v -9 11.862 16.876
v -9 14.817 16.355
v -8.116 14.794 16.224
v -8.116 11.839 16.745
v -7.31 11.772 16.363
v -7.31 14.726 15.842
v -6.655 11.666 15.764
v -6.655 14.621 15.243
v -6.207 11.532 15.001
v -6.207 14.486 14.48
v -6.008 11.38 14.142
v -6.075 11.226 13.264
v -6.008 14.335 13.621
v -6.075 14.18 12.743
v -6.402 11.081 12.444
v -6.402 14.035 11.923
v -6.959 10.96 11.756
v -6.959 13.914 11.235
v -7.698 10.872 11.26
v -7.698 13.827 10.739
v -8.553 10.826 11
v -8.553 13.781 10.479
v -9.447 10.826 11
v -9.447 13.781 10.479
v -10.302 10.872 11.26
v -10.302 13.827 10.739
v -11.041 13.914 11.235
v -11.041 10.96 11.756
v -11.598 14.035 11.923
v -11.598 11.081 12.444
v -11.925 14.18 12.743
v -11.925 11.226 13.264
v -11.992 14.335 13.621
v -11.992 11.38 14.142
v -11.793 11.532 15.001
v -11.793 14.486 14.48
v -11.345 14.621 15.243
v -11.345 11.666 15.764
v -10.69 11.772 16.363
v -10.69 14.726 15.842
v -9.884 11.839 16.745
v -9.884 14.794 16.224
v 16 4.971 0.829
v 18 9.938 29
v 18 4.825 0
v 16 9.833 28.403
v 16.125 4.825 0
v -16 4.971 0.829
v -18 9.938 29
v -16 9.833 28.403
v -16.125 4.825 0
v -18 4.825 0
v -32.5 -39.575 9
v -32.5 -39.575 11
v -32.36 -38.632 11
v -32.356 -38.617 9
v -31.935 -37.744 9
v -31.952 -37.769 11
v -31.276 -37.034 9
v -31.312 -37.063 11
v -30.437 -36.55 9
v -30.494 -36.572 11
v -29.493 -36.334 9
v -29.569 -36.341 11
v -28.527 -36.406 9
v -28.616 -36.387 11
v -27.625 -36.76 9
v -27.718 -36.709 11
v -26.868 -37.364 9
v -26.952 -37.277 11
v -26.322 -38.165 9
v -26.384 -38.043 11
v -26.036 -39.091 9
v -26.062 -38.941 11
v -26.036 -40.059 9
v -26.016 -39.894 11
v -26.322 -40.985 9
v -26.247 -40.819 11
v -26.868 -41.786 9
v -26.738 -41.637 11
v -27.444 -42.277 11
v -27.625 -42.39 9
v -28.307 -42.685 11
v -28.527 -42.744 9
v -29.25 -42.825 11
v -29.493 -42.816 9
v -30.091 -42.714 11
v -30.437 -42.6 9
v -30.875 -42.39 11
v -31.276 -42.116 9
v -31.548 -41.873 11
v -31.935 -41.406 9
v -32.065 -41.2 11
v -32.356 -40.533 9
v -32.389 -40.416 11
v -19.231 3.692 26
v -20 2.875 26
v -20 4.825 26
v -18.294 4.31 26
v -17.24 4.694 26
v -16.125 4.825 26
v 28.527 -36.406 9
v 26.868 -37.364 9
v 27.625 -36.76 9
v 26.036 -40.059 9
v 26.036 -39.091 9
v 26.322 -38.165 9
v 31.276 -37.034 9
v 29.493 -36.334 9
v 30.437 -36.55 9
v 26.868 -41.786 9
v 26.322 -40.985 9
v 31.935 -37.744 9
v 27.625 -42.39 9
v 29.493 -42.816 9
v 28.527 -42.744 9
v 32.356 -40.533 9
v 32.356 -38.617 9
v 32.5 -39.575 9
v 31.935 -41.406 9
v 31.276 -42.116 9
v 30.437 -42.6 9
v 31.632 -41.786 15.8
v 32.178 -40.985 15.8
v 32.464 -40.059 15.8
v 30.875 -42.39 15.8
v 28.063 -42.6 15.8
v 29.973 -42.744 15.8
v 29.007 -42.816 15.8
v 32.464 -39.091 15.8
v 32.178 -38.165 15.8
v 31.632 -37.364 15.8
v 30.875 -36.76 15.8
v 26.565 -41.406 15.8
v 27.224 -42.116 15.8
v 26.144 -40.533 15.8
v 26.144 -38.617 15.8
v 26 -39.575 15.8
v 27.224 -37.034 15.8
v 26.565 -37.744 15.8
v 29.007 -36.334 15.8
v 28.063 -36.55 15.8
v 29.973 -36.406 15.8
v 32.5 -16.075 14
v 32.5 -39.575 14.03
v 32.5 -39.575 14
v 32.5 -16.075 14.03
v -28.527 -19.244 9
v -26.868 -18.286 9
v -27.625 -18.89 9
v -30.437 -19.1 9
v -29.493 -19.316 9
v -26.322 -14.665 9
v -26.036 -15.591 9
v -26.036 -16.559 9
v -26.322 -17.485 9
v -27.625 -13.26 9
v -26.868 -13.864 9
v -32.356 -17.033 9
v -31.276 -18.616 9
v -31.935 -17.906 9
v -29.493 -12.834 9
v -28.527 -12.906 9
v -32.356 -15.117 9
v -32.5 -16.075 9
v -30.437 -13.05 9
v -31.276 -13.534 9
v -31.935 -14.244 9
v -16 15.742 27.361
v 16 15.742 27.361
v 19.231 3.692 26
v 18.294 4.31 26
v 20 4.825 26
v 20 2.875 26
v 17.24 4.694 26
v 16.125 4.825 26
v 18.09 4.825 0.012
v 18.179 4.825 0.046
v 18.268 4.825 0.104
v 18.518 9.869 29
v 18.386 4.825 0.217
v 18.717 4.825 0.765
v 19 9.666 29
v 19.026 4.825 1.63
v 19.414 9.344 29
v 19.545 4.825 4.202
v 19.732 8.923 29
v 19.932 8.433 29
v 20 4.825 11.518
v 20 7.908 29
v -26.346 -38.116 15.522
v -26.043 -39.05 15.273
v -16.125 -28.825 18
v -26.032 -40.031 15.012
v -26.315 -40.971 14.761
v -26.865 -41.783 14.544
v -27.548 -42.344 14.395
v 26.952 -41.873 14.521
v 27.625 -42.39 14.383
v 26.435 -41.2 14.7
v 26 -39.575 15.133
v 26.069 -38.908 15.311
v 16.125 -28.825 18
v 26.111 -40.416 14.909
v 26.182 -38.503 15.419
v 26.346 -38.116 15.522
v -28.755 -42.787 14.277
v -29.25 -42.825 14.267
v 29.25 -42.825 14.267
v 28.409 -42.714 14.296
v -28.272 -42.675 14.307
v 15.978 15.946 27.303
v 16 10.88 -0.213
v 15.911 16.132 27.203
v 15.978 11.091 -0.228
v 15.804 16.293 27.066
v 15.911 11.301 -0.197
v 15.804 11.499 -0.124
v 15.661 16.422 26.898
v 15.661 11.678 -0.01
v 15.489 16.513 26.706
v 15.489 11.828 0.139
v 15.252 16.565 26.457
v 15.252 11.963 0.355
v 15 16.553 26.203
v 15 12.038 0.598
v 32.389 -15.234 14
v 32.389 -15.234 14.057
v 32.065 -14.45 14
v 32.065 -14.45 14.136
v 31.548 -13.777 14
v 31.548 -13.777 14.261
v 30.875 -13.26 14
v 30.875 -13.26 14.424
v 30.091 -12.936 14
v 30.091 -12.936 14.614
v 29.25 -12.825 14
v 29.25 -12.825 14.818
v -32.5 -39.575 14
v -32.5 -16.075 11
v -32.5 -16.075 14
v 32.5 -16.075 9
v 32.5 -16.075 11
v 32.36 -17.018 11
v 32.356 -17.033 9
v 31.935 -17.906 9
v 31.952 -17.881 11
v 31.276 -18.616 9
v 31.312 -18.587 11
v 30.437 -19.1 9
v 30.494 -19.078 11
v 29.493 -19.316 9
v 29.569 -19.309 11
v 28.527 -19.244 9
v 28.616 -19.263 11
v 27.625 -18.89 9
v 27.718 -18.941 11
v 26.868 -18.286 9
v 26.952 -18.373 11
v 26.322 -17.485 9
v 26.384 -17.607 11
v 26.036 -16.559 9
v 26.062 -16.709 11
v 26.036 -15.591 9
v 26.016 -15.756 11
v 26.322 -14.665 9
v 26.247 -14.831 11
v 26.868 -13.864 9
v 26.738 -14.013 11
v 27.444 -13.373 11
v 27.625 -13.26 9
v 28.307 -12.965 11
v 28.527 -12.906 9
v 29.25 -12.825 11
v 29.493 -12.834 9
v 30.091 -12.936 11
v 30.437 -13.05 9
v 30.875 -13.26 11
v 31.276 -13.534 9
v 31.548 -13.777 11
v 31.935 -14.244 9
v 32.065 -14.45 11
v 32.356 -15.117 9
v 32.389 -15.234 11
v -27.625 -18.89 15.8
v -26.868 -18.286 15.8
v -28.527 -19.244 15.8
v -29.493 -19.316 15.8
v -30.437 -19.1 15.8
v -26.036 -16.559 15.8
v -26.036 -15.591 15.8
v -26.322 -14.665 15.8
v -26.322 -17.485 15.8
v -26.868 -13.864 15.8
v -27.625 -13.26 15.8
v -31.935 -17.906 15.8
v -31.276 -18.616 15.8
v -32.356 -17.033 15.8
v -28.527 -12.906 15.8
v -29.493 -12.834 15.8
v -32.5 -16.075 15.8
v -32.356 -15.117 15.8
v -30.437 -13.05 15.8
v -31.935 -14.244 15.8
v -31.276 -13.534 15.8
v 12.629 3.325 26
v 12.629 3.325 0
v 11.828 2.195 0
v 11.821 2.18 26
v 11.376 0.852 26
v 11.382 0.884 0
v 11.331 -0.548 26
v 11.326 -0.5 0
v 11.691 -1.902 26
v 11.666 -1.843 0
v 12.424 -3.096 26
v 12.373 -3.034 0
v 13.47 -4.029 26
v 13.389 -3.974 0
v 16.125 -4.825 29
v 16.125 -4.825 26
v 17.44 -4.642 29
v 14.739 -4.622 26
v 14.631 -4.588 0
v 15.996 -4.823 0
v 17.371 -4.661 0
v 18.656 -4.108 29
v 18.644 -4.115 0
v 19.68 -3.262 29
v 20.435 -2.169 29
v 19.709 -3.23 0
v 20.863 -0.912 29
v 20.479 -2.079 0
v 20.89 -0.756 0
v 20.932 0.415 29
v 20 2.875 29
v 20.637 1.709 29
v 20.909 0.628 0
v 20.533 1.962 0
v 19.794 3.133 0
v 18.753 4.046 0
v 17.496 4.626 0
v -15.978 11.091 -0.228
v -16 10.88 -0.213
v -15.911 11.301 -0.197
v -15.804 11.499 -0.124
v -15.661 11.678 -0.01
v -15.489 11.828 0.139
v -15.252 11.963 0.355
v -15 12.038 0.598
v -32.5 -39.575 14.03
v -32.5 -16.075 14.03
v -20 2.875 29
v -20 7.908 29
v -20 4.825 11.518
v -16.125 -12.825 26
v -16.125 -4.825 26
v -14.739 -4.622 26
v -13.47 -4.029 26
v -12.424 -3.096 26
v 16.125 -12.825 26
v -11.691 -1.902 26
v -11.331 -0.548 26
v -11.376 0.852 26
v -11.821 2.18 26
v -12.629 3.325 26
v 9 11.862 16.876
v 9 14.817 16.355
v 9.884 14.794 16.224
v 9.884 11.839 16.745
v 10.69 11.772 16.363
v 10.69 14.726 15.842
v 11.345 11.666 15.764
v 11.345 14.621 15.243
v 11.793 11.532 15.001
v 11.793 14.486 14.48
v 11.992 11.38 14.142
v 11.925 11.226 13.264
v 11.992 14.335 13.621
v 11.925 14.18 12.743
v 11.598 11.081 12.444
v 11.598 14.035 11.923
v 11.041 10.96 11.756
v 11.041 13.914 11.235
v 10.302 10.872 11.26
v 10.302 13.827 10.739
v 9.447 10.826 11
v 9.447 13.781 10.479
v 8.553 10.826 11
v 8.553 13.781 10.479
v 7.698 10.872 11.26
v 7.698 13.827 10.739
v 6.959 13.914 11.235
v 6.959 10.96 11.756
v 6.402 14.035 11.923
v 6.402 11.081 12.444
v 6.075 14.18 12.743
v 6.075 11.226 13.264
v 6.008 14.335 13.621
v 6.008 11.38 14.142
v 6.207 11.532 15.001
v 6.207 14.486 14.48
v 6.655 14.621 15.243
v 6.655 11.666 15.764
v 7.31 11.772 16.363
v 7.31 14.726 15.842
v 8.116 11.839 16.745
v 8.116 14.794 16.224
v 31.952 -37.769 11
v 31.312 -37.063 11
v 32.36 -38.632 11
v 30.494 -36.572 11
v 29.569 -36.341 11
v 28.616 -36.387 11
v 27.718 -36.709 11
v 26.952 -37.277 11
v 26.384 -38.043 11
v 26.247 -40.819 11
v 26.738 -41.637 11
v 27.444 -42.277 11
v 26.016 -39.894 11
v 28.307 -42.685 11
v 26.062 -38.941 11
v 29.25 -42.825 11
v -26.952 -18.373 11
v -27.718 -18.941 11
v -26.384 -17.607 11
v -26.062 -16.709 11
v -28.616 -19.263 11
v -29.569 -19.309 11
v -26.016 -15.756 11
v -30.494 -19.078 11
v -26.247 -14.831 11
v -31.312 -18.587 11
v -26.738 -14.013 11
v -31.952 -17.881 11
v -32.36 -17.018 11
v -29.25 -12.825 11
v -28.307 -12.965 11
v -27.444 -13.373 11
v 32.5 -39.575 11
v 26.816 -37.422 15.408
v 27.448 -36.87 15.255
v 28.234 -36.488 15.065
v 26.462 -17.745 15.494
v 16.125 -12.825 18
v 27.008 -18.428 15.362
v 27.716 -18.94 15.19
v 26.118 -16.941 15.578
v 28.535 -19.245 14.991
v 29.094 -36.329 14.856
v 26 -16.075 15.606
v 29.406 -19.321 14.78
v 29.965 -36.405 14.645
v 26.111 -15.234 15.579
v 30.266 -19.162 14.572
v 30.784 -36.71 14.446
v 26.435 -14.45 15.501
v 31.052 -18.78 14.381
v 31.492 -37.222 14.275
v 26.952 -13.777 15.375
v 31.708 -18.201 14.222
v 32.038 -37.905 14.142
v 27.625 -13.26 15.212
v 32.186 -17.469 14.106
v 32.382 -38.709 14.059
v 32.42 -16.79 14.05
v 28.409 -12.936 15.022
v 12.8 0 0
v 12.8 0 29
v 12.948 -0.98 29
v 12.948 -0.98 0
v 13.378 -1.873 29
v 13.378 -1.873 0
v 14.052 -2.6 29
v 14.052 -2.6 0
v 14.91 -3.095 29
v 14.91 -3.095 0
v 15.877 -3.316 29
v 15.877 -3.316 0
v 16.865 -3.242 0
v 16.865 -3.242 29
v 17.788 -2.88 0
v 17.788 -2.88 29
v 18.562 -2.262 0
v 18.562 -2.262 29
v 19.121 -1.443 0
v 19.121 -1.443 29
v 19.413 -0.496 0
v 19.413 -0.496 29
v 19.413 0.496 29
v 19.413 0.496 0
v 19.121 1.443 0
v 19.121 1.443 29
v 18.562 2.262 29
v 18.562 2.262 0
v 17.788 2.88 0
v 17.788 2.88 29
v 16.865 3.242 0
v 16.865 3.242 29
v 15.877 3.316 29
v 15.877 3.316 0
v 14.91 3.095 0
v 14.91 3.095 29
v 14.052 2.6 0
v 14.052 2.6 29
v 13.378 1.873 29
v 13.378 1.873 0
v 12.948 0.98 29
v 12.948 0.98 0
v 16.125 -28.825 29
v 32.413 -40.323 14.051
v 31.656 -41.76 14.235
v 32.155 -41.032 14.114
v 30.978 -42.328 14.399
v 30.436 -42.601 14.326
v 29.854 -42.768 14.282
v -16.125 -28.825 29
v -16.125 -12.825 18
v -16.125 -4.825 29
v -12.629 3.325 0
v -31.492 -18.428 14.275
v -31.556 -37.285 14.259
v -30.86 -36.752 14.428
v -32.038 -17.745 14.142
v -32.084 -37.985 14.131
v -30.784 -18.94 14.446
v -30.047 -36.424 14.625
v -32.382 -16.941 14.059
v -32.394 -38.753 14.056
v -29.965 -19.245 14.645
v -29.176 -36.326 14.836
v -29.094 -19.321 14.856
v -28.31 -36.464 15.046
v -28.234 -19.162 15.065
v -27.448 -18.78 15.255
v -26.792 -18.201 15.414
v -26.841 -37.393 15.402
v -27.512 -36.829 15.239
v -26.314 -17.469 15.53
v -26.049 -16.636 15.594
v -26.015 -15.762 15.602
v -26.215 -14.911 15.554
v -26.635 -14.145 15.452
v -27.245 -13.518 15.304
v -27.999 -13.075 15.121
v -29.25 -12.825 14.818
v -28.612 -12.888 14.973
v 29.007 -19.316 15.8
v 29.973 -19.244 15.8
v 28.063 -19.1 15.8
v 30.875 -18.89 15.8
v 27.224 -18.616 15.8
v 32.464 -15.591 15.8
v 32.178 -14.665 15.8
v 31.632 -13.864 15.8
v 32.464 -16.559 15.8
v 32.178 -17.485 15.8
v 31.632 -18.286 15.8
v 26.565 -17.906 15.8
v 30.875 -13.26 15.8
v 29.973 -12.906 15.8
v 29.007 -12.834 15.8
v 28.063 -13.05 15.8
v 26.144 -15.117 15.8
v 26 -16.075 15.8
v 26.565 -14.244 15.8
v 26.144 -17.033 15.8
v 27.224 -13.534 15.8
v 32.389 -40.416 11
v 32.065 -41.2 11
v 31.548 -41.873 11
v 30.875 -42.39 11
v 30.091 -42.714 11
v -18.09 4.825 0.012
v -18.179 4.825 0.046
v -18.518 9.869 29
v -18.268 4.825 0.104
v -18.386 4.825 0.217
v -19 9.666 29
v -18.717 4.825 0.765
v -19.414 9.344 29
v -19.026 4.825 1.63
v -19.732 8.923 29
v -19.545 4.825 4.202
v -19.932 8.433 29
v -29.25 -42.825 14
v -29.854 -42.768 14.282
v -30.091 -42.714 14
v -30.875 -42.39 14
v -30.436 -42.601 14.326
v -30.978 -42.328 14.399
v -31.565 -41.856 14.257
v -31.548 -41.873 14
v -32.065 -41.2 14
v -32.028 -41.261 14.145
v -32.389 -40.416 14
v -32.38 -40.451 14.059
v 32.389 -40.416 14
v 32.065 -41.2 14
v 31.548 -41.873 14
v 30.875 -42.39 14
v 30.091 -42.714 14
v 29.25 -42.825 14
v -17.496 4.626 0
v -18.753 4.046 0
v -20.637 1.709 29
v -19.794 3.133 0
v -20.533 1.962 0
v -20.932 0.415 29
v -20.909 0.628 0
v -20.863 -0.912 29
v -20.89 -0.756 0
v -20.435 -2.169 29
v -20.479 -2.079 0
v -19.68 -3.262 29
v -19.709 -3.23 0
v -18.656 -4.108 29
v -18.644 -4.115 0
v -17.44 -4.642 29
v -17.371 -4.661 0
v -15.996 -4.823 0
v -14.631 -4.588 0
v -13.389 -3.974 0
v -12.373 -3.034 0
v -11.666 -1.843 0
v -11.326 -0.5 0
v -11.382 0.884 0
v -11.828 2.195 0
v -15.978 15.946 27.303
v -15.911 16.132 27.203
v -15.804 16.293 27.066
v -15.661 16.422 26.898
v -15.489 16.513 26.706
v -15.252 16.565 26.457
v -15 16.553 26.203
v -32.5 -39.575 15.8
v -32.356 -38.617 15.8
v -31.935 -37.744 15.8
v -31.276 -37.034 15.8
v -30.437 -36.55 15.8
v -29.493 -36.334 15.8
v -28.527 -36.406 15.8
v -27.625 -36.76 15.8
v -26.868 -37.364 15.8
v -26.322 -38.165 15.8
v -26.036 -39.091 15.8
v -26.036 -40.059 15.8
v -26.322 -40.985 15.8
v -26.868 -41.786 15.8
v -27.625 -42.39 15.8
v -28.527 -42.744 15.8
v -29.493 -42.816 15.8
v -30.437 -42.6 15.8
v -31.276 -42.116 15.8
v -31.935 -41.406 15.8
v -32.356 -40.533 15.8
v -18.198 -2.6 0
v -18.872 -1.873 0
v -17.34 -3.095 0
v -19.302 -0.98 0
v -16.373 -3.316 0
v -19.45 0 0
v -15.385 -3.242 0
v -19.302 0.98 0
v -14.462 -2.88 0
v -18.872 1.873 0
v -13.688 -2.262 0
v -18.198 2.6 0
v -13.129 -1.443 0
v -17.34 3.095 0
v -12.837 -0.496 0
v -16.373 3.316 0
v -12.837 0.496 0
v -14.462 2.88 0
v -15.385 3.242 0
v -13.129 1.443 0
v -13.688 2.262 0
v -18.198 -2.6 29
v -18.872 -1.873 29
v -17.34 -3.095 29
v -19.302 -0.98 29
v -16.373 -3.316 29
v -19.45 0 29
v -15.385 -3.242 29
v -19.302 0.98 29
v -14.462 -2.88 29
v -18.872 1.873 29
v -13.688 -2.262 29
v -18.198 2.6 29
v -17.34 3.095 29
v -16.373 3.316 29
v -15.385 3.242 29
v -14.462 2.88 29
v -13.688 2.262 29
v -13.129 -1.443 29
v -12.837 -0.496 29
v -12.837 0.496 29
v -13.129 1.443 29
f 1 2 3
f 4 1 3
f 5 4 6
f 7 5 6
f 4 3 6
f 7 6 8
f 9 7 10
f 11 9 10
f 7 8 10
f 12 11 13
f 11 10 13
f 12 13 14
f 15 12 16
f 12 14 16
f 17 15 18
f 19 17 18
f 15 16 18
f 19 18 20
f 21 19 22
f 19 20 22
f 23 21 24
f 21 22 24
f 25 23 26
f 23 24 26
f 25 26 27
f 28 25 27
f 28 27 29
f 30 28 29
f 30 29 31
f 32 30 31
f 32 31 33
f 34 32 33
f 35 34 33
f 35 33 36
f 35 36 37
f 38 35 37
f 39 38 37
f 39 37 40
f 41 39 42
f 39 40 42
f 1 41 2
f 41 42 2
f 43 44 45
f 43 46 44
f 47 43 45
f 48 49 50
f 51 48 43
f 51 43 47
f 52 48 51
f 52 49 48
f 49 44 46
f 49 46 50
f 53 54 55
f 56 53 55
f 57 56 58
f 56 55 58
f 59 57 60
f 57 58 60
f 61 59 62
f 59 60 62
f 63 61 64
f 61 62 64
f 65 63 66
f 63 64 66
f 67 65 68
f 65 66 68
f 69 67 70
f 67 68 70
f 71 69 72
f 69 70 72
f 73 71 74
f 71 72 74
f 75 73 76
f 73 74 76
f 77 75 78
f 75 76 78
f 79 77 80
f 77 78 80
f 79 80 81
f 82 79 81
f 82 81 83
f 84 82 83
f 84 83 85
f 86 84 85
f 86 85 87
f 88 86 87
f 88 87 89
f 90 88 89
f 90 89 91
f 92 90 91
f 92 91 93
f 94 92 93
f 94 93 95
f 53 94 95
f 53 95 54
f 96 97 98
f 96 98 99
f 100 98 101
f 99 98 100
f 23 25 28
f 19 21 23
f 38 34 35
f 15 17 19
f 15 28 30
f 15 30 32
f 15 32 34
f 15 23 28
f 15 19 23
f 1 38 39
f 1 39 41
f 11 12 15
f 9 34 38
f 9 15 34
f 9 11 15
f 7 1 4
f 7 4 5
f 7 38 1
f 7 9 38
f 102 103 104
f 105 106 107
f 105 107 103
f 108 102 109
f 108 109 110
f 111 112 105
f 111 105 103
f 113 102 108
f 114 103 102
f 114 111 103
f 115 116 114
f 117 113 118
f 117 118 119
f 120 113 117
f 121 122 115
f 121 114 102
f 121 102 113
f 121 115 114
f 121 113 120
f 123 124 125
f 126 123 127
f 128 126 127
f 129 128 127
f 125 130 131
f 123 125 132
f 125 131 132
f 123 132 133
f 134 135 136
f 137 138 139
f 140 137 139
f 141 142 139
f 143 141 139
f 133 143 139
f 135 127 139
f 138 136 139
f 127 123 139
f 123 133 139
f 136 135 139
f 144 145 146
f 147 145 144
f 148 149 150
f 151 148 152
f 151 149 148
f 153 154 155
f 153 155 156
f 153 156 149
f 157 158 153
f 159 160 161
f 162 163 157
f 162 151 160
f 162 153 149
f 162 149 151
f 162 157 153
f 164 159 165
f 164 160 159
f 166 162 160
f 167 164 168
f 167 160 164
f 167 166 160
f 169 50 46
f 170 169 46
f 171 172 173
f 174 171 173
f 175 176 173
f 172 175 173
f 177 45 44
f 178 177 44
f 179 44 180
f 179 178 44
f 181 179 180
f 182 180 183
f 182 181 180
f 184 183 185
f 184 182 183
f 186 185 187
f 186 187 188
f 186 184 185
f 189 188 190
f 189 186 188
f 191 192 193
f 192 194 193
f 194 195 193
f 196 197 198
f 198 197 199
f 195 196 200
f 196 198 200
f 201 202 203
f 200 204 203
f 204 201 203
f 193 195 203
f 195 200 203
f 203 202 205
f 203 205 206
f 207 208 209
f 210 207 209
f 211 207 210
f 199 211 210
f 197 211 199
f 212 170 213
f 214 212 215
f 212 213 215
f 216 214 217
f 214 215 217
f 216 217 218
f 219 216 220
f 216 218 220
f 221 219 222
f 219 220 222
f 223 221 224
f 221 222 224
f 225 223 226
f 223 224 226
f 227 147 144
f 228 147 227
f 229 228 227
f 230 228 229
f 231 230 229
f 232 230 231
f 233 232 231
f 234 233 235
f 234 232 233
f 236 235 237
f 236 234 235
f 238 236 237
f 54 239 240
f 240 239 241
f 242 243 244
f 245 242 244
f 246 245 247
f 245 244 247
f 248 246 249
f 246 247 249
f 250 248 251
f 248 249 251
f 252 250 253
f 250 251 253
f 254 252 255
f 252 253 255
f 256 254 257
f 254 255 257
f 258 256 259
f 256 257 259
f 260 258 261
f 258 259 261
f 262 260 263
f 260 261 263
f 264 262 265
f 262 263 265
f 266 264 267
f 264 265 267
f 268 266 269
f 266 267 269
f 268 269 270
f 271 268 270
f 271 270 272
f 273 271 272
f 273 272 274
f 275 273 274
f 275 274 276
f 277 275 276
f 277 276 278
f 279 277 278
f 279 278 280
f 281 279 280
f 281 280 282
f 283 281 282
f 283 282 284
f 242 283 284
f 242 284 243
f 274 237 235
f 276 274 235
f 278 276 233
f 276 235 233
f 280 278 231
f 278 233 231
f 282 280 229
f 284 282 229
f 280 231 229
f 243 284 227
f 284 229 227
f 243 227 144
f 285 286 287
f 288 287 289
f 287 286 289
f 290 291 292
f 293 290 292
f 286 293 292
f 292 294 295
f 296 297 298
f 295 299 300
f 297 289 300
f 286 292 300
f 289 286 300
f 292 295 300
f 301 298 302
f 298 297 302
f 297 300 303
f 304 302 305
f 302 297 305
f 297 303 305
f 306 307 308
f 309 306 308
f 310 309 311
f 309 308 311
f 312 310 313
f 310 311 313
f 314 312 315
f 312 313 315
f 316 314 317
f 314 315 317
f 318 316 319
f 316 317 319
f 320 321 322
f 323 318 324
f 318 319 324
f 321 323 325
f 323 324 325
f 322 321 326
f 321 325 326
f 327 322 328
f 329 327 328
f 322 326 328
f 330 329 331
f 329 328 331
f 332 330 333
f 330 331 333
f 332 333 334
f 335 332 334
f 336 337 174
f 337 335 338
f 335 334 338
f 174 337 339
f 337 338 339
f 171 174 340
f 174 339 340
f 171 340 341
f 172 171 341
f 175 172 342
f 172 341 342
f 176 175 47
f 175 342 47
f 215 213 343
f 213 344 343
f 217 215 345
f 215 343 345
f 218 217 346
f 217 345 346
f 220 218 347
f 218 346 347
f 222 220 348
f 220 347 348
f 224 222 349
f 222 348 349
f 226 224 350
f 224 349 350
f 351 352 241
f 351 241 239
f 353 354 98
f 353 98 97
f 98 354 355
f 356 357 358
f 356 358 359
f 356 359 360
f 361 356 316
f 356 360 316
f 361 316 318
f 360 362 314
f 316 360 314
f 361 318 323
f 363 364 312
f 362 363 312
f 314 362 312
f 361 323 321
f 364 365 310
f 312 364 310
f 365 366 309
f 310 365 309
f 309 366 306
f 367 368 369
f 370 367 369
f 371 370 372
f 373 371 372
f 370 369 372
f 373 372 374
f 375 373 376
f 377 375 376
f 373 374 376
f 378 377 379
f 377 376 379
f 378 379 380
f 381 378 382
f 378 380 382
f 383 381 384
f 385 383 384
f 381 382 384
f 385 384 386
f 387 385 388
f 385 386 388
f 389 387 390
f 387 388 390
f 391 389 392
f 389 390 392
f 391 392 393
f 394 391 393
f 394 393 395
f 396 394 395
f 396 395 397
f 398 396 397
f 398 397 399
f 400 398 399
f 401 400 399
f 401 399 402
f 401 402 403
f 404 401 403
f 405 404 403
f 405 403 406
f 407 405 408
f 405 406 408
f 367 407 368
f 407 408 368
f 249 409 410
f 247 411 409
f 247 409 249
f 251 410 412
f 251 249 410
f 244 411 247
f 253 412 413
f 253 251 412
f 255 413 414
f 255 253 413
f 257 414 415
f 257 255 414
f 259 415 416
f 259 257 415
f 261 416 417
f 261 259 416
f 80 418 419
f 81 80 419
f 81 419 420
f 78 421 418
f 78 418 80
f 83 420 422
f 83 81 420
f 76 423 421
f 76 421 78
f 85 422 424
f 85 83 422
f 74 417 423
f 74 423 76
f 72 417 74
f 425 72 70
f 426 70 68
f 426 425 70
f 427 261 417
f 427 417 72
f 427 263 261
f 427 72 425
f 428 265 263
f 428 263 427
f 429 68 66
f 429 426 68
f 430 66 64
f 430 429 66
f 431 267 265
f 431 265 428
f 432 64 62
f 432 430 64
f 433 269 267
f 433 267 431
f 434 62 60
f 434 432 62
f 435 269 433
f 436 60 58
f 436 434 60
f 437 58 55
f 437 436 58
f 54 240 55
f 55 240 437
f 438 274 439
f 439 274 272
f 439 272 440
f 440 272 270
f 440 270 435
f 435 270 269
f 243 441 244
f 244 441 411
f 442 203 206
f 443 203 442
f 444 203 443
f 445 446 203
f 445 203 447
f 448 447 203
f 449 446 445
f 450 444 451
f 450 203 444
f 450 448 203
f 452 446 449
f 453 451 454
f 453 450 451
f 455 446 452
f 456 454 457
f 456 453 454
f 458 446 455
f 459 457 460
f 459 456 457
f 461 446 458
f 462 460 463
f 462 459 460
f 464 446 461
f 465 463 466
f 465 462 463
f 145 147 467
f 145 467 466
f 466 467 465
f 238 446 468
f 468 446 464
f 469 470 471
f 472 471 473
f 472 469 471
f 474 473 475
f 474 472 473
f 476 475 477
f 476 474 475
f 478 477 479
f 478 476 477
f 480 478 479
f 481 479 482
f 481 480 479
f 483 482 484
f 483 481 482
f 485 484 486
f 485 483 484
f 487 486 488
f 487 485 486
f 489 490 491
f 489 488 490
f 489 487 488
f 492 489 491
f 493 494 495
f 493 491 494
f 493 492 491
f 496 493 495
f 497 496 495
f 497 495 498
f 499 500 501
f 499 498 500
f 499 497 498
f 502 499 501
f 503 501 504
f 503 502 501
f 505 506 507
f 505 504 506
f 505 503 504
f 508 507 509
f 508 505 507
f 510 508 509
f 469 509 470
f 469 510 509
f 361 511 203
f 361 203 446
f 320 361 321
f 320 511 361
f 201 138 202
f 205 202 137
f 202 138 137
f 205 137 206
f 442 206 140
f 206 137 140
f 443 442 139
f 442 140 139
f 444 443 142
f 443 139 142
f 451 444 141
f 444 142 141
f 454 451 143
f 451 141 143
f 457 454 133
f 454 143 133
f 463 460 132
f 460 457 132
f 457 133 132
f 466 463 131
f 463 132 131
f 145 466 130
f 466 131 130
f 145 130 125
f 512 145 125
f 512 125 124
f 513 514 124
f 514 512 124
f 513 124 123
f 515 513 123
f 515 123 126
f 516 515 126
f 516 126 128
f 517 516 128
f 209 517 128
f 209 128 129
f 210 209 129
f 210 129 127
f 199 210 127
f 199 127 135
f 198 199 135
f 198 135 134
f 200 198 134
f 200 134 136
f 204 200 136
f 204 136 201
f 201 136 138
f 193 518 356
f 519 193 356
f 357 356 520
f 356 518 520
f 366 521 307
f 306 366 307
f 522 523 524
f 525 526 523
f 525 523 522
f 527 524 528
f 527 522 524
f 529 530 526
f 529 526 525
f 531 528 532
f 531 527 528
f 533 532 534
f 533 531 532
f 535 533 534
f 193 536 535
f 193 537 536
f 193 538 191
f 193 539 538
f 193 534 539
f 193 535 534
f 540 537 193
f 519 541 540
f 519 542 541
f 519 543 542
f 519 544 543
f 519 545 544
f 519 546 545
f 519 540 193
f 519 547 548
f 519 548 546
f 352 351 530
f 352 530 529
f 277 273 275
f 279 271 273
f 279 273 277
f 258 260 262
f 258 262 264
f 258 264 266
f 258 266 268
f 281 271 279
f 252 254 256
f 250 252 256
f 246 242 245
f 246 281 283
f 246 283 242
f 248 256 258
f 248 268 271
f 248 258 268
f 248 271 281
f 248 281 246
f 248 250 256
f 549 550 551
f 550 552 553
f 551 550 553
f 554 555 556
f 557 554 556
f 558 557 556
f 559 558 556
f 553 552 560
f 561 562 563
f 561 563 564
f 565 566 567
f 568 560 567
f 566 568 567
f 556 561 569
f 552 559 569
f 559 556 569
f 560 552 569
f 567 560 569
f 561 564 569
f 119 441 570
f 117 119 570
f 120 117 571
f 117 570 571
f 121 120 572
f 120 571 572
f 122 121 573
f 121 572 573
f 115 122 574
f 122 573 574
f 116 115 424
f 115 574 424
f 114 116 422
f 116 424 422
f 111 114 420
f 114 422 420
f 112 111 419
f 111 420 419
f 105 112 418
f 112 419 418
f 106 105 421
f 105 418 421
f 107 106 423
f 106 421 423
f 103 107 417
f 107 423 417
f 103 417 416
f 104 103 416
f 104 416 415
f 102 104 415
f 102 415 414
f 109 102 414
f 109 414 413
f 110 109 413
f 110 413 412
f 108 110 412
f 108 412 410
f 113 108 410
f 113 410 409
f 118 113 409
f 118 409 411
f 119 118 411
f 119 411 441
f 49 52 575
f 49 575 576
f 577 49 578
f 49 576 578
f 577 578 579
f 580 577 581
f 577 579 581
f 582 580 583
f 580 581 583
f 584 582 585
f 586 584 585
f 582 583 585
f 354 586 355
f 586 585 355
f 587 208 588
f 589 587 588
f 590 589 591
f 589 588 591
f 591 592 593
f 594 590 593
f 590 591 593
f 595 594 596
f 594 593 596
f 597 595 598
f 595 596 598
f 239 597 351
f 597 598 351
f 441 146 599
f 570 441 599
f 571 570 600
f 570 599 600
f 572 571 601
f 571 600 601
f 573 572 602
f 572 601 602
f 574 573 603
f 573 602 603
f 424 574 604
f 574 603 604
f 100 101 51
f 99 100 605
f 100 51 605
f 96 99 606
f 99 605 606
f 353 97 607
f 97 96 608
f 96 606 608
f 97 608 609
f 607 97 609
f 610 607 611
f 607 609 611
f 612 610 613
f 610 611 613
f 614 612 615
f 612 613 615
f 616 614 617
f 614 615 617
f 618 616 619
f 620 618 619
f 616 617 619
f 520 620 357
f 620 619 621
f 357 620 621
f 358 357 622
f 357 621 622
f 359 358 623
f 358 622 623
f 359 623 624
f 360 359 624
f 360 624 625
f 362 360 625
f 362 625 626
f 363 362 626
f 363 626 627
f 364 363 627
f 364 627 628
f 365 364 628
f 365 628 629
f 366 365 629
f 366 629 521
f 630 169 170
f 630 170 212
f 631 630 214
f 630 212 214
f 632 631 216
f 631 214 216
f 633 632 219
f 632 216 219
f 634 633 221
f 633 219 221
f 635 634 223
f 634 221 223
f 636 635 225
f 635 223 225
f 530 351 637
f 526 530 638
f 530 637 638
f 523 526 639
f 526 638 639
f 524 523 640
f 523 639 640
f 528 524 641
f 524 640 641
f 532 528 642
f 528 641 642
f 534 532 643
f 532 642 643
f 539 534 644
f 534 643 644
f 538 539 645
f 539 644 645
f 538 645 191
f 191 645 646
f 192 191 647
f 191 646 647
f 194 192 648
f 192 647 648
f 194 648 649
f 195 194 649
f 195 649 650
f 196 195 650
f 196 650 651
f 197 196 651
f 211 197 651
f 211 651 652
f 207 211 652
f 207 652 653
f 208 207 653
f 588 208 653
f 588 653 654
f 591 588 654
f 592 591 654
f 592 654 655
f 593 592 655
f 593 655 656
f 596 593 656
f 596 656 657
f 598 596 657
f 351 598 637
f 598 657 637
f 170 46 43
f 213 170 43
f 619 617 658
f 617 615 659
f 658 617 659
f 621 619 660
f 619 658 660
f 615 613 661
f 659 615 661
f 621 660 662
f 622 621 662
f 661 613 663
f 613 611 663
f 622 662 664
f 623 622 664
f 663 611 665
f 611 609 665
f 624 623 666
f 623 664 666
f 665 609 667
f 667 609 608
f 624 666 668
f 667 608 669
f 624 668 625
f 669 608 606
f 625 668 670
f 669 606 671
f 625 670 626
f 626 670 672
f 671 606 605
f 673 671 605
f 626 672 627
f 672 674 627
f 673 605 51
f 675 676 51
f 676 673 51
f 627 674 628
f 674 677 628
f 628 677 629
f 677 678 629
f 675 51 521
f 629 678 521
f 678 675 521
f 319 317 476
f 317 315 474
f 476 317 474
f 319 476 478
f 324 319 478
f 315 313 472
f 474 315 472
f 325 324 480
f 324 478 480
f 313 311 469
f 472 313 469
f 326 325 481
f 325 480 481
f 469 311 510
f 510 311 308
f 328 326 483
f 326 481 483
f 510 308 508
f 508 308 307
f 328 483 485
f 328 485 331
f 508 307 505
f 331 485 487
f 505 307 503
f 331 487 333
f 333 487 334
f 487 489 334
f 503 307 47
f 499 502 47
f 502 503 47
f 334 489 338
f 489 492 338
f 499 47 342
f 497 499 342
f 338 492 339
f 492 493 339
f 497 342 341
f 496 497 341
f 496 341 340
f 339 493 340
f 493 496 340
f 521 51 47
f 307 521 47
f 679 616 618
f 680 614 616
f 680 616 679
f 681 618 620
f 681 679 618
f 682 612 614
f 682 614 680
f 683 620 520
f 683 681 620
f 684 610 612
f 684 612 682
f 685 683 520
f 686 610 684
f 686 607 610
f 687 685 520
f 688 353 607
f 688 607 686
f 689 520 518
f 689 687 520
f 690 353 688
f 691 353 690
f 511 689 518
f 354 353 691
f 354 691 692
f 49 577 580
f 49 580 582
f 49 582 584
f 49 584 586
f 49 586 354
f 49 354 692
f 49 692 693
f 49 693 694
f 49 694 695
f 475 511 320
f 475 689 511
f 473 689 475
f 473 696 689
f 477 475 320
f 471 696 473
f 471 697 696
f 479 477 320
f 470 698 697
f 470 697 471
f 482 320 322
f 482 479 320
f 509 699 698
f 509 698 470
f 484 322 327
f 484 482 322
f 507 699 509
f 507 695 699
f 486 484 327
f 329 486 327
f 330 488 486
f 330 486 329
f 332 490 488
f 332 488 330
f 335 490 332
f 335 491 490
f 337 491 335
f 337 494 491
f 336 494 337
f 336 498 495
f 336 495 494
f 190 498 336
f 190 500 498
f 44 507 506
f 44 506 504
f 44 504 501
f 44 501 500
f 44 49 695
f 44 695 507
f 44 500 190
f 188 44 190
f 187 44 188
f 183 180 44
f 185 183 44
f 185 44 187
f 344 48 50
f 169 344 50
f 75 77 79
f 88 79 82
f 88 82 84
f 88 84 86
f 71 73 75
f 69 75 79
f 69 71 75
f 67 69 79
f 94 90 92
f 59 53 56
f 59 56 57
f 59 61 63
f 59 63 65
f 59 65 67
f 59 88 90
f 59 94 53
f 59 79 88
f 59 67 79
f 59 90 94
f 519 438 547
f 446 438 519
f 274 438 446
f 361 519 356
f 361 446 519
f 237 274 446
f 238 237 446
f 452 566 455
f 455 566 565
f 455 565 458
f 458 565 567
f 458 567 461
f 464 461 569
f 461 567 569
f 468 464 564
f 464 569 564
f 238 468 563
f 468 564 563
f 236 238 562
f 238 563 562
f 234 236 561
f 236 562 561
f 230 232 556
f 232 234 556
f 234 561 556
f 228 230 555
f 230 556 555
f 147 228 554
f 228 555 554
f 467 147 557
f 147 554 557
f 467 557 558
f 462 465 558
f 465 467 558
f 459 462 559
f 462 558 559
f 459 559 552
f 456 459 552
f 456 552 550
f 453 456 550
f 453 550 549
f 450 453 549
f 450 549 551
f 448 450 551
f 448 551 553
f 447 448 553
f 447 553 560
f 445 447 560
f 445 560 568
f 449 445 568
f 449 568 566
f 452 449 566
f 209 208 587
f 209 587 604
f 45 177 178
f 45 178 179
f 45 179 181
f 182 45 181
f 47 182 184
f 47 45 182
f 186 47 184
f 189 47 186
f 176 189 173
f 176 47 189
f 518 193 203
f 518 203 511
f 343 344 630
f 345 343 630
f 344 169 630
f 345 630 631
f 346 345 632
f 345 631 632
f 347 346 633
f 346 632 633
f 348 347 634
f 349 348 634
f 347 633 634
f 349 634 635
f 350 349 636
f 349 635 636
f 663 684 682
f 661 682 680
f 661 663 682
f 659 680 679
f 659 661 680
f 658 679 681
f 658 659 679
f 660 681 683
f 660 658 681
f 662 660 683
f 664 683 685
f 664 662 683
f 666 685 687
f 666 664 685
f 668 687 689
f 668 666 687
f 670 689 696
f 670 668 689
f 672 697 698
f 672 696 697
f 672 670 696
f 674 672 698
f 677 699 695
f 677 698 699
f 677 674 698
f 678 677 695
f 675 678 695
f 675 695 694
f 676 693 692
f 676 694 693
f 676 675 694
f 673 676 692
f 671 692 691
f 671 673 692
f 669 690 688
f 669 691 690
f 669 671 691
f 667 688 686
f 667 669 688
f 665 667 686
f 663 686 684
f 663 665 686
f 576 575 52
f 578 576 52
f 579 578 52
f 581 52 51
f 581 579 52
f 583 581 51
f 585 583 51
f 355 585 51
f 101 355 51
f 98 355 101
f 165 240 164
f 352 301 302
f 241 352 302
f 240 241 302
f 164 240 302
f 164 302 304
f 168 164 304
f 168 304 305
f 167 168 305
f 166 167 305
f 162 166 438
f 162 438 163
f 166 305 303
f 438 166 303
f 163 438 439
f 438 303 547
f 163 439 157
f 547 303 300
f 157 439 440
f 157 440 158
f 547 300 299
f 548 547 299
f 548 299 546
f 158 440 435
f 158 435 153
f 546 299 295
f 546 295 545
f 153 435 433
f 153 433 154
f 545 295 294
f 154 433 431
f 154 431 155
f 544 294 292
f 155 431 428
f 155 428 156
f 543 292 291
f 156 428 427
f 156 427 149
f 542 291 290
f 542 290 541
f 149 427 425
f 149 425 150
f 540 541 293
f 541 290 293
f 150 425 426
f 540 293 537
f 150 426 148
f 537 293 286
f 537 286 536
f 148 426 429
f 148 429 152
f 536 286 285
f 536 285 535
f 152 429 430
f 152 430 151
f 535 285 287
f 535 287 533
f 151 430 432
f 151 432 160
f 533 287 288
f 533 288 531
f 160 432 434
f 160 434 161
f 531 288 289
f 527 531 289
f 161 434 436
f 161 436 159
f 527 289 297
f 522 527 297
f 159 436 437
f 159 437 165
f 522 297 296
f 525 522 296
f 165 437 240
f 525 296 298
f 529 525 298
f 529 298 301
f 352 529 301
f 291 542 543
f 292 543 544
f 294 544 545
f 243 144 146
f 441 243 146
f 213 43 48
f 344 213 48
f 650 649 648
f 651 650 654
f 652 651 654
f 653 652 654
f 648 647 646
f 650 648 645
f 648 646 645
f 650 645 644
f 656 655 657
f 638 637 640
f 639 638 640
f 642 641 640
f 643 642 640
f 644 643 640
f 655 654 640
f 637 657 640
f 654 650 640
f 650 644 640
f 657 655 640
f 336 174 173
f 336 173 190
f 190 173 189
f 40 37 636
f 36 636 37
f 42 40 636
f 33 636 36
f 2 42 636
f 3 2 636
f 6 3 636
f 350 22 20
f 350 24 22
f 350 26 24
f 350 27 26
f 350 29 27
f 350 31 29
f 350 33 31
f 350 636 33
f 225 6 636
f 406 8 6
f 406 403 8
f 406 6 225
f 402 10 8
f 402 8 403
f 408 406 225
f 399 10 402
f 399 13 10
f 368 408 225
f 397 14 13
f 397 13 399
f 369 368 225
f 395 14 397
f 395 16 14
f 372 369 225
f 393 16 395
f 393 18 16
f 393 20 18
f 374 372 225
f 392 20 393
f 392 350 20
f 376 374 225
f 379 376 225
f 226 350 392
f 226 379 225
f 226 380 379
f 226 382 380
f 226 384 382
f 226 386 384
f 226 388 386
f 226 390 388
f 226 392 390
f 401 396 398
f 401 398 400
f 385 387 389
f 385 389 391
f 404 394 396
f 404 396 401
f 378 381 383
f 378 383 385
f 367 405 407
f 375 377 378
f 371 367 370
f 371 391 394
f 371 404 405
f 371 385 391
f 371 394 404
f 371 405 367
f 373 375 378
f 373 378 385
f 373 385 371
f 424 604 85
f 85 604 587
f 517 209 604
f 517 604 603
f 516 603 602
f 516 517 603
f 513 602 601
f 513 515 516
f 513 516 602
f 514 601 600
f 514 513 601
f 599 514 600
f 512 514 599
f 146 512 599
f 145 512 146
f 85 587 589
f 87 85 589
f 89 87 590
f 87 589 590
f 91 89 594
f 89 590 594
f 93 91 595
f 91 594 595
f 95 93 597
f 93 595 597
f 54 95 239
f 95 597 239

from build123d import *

# Parameters (mm, degrees)
SKETCH_1_R               = 4.824999999999997
SKETCH_1_R_2             = 3.3250000000000033
EXTRUDE_1_DEPTH          = 29
SKETCH_1_R_3             = 4.825
SKETCH_1_R_4             = 3.3249999999999997
EXTRUDE_1_2_DEPTH        = 29
EXTRUDE_2_DEPTH          = 20
EXTRUDE_2_DEPTH_BACK     = 20
FILLET_2_R               = 2
EXTRUDE_11_DEPTH         = 29
EXTRUDE_13_DEPTH         = 7
FILLET_3_R               = 1
SKETCH_11_R              = 3.0000000000000013
SKETCH_11_R_2            = 2.999999999999999
CUT_EXTRUDE_1_DEPTH      = 3
EXTRUDE_START            = -3
EXTRUDE_14_DEPTH         = 3
SKETCH_13_W              = 32.25
SKETCH_13_H              = 3
EXTRUDE_15_DEPTH         = 24
SKETCH_14_W              = 32.25
SKETCH_14_H              = 16
EXTRUDE_16_DEPTH         = 12
EXTRUDE_17_DEPTH         = 3
SKETCH_16_R              = 3.250000000000001
SKETCH_16_R_2            = 3.2500000000000013
SKETCH_16_R_3            = 3.2499999999999982
EXTRUDE_18_DEPTH         = 2
CUT_EXTRUDE_START        = -6
SKETCH_17_W              = 68.56383691944288
SKETCH_17_H              = 32.56782253673537
CUT_EXTRUDE_2_DEPTH      = 6
SKETCH_18_W              = 4.000000000000002
SKETCH_18_H              = 16
EXTRUDE_19_DEPTH         = 16.5
SKETCH_19_W              = 4.000000000000002
SKETCH_19_H              = 16.000000000000007
EXTRUDE_20_DEPTH         = 16.5
CUT_EXTRUDE_4_DEPTH      = 17
EXTRUDE_21_DEPTH         = 15
CUT_EXTRUDE_5_DEPTH      = 25
CUT_EXTRUDE_5_DEPTH_BACK = 55.00000000000001
CUT_EXTRUDE_START_2      = -5
SKETCH_23_W              = 70.20398187811678
SKETCH_23_H              = 36.48154516810434
CUT_EXTRUDE_6_DEPTH      = 5
EXTRUDE_START_2          = -4.8
SKETCH_16_2_R            = 3.250000000000001
SKETCH_16_2_R_2          = 3.2500000000000013
SKETCH_16_2_R_3          = 3.2499999999999982
EXTRUDE_22_DEPTH         = 4.8


with BuildPart() as part:
    # Эскиз1 → Бобышка-Вытянуть1 (new body)
    with BuildSketch(Plane.XY):
        with Locations((16.125, 0)):
            Circle(SKETCH_1_R)
        with Locations((16.125, 0)):
            Circle(SKETCH_1_R_2, mode=Mode.SUBTRACT)
    extrude(amount=EXTRUDE_1_DEPTH)



with BuildPart() as body_2:
    # Эскиз1 → Extrude 1 2 (new body)
    with BuildSketch(Plane.XY):
        with Locations((-16.125, 0)):
            Circle(SKETCH_1_R_3)
        with Locations((-16.125, 0)):
            Circle(SKETCH_1_R_4, mode=Mode.SUBTRACT)
    extrude(amount=EXTRUDE_1_2_DEPTH)


with BuildPart() as body_3:
    # Эскиз4 → Бобышка-Вытянуть2 (new, two sides: drawn at the far end of the back side and taken through both)
    with BuildSketch(Plane(origin=(0, 0, 0), x_dir=(0, 0, -1), z_dir=(1, 0, 0)).offset(-EXTRUDE_2_DEPTH_BACK)):
        Polygon((-29, 4.824999999999997), (-29, 9.938482440545272), (-1.388e-14, 4.824999999999997), align=None)
    extrude(amount=EXTRUDE_2_DEPTH + EXTRUDE_2_DEPTH_BACK)

    # Скругление2
    fillet_2_edges = [body_3.edges().sort_by_distance(p)[0] for p in [
        (20, 7.381741220272634, 14.500000000000007),
        (-20, 7.381741220272634, 14.500000000000007),
    ]]
    fillet(fillet_2_edges, radius=FILLET_2_R)


with BuildPart() as part_1:
    add(part.part)

    add(body_2.part)  # Бобышка-Вытянуть11 merges body 2

    add(body_3.part)  # Бобышка-Вытянуть11 merges body 3
    # Эскиз10 → Бобышка-Вытянуть11 (add)
    with BuildSketch(Plane(origin=(0, 0, 0), x_dir=(-1, 0, 0), z_dir=(0, 0, -1))):
        Polygon((-16.125, 4.8249999999999975), (16.125, 4.824999999999997), (16.125, 3.3249999999999975), (-16.125, 3.3249999999999975), align=None)
    extrude(amount=-EXTRUDE_11_DEPTH)

    # Эскиз6 → Бобышка-Вытянуть13 (add)
    with BuildSketch(Plane(origin=(0, 4.6795084476460085, -0.8251235957731434), x_dir=(1, 0, 0), z_dir=(0, 0.9848077530122092, -0.17364817766692356))):
        Polygon((-16, -1.6794043064520388), (-16, -29.67940430645204), (16, -29.679404306452035), (16, -1.6794043064520352), align=None)
    extrude(amount=EXTRUDE_13_DEPTH)

    # Скругление3
    fillet_3_edges = [part_1.edges().sort_by_distance(p)[0] for p in [
        (0, 16.726937190786714, 27.18784662633631),
        (16, 14.295862703449783, 13.400538084165378),
        (0, 11.864788216112855, -0.38677045800554954),
        (-16, 14.295862703449785, 13.400538084165381),
    ]]
    fillet(fillet_3_edges, radius=FILLET_3_R)

    # Эскиз11 → Вырез-Вытянуть1 (cut)
    with BuildSketch(Plane(origin=(0, 11.57316271873147, -2.0406608394416086), x_dir=(1, 0, 0), z_dir=(0, 0.9848077530122092, -0.1736481776669236))):
        with Locations((-9.000000000000005, -15.679404306452042)):
            Circle(SKETCH_11_R)
        with Locations((8.999999999999998, -15.679404306452039)):
            Circle(SKETCH_11_R_2)
    extrude(amount=-CUT_EXTRUDE_1_DEPTH, mode=Mode.SUBTRACT)

    # Эскиз12 → Бобышка-Вытянуть14 (add)
    with BuildSketch(Plane.XY.offset(29).offset(EXTRUDE_START)):
        with BuildLine():
            Line((-16.125000000000018, 4.824999999999999), (-20, 4.824999999999997))
            Line((-20, 4.824999999999997), (-20, 2.874891302293008))
            ThreePointArc((-20, 2.874891302293009), (-18.29401757328477, 4.309986979885419), (-16.125000000000018, 4.824999999999999))
        make_face()
        with BuildLine():
            ThreePointArc((16.125000000000004, 4.824999999999996), (18.294017573284762, 4.30998697988542), (20, 2.8748913022930056))
            Line((20, 2.874891302293005), (20, 4.824999999999997))
            Line((20, 4.824999999999997), (16.125000000000004, 4.824999999999997))
        make_face()
        with BuildLine():
            ThreePointArc((-12.62857325259058, 3.3249999999999975), (-11.690828713276888, -1.9023012379746749), (-16.125000000000014, -4.824999999999999))
            Line((-16.125, -4.824999999999998), (16.125, -4.824999999999997))
            ThreePointArc((16.125000000000004, -4.824999999999996), (11.690828713276861, -1.9023012379746778), (12.628573252590584, 3.3249999999999975))
            Line((12.628573252590584, 3.3249999999999975), (-12.62857325259058, 3.3249999999999975))
        make_face()
    extrude(amount=EXTRUDE_14_DEPTH)

    # Эскиз13 → Бобышка-Вытянуть15 (add)
    with BuildSketch(Plane.XZ.offset(4.8249999999999975)):
        with Locations((0, 27.500000000000004)):
            Rectangle(SKETCH_13_W, SKETCH_13_H)
    extrude(amount=EXTRUDE_15_DEPTH)



with BuildPart() as body_2_2:
    # Эскиз14 → Бобышка-Вытянуть16 (new body)
    with BuildSketch(Plane(origin=(0, 0, 26.000000000000004), x_dir=(-1, 0, 0), z_dir=(0, 0, -1))):
        with Locations((0, -20.824999999999996)):
            Rectangle(SKETCH_14_W, SKETCH_14_H)
    extrude(amount=EXTRUDE_16_DEPTH)


with BuildPart() as part_2:
    add(part_1.part)

    add(body_2_2.part)  # Бобышка-Вытянуть17 merges body 2 2
    # Эскиз15 → Бобышка-Вытянуть17 (add)
    with BuildSketch(Plane(origin=(0, 0, 14.000000000000002), x_dir=(-1, 0, 0), z_dir=(0, 0, -1))):
        Polygon((-32.5, -42.82499999999999), (32.5, -42.82499999999999), (32.5, -12.824999999999992), (-32.5, -12.824999999999982), align=None)
    extrude(amount=EXTRUDE_17_DEPTH)

    # Эскиз16 → Бобышка-Вытянуть18 (add)
    with BuildSketch(Plane(origin=(0, 0, 11.000000000000004), x_dir=(-1, 0, 0), z_dir=(0, 0, -1))):
        with Locations((29.25, -16.074999999999992)):
            Circle(SKETCH_16_R)
        with Locations((-29.250000000000004, -16.0750000000004)):
            Circle(SKETCH_16_R_2)
        with Locations((29.250000000000245, -39.57499999999999)):
            Circle(SKETCH_16_R_3)
        with Locations((-29.24999999999976, -39.5750000000004)):
            Circle(SKETCH_16_R_3)
    extrude(amount=EXTRUDE_18_DEPTH)

    # Эскиз17 → Вырез-Вытянуть2 (cut)
    with BuildSketch(Plane(origin=(0, 0, 11.000000000000004), x_dir=(-1, 0, 0), z_dir=(0, 0, -1)).offset(CUT_EXTRUDE_START)):
        with Locations((-0.2272214266866719, -27.98398422513318)):
            Rectangle(SKETCH_17_W, SKETCH_17_H)
        with BuildLine():
            Line((-32.50000000000001, -16.0750000000004), (-32.49999999999967, -39.57500000000042))
            ThreePointArc((-32.49999999999967, -39.57500000000042), (-31.548097038855932, -41.87309703885639), (-29.24999999999976, -42.82500000000041))
            Line((-29.24999999999976, -42.82500000000041), (29.250000000000245, -42.82499999999999))
            ThreePointArc((29.250000000000245, -42.82499999999999), (31.548097038856366, -41.87309703885618), (32.5, -39.57499999999999))
            Line((32.5, -39.57499999999999), (32.5, -16.074999999999992))
            ThreePointArc((32.5, -16.074999999999992), (31.54809703885628, -13.776902961143712), (29.25, -12.824999999999989))
            Line((29.25, -12.824999999999989), (-29.250000000000004, -12.825000000000399))
            ThreePointArc((-29.250000000000004, -12.825000000000399), (-31.548097038856284, -13.776902961144119), (-32.50000000000001, -16.0750000000004))
        make_face(mode=Mode.SUBTRACT)
    extrude(amount=CUT_EXTRUDE_2_DEPTH, mode=Mode.SUBTRACT)

    # Эскиз18 → Бобышка-Вытянуть19 (add)
    with BuildSketch(Plane(origin=(16.125, 8.7e-16, 0), x_dir=(0, 0, -1), z_dir=(1, 5e-17, 0))):
        with Locations((-16.000000000000004, -20.824999999999996)):
            Rectangle(SKETCH_18_W, SKETCH_18_H)
    extrude(amount=EXTRUDE_19_DEPTH)

    # Эскиз19 → Бобышка-Вытянуть20 (add)
    with BuildSketch(Plane.ZY.offset(16.125)):
        with Locations((16.000000000000004, -20.824999999999992)):
            Rectangle(SKETCH_19_W, SKETCH_19_H)
    extrude(amount=EXTRUDE_20_DEPTH)

    # Эскиз20 → Вырез-Вытянуть4 (cut)
    with BuildSketch(Plane.XZ.offset(28.824999999999996)):
        Polygon((-16.125, 18.000000000000004), (-32.625, 18.000000000000004), (-32.625, 14.000000000000002), align=None)
        Polygon((16.125, 18.000000000000004), (32.625, 18.000000000000004), (32.625, 14.000000000000002), align=None)
    extrude(amount=-CUT_EXTRUDE_4_DEPTH, mode=Mode.SUBTRACT)

    # Эскиз21 → Бобышка-Вытянуть21 (add)
    with BuildSketch(Plane.XZ.offset(28.824999999999996)):
        Polygon((-32.625, 14.000000000000002), (-16.125, 18.000000000000004), (16.125, 18.000000000000004), (32.625, 14.000000000000002), align=None)
    extrude(amount=EXTRUDE_21_DEPTH)

    # Эскиз22 → Вырез-Вытянуть5 (cut, two sides: drawn at the far end of the back side and taken through both)
    with BuildSketch(Plane.ZY.offset(16.125).offset(-CUT_EXTRUDE_5_DEPTH_BACK)):
        Polygon((18.000000000000004, -28.824999999999996), (18.000000000000004, -43.824999999999996), (14.000000000000002, -43.825), align=None)
    extrude(amount=CUT_EXTRUDE_5_DEPTH + CUT_EXTRUDE_5_DEPTH_BACK, mode=Mode.SUBTRACT)

    # Эскиз23 → Вырез-Вытянуть6 (cut)
    with BuildSketch(Plane(origin=(0, 0, 11.000000000000004), x_dir=(-1, 0, 0), z_dir=(0, 0, -1)).offset(CUT_EXTRUDE_START_2)):
        with Locations((-0.29473783212394267, -28.29954927053208)):
            Rectangle(SKETCH_23_W, SKETCH_23_H)
        with BuildLine():
            Line((-29.250000000000004, -12.825000000000399), (29.25, -12.824999999999989))
            ThreePointArc((29.25, -12.824999999999989), (31.548097038856287, -13.776902961143705), (32.5, -16.074999999999992))
            Line((32.5, -16.074999999999992), (32.50000000000024, -39.57499999999999))
            ThreePointArc((32.50000000000024, -39.57499999999999), (31.548097038856532, -41.87309703885627), (29.25000000000025, -42.82499999999999))
            Line((29.25000000000025, -42.82499999999999), (-29.24999999999976, -42.82500000000041))
            ThreePointArc((-29.24999999999976, -42.82500000000041), (-31.54809703885605, -41.87309703885669), (-32.49999999999976, -39.5750000000004))
            Line((-32.49999999999976, -39.5750000000004), (-32.50000000000001, -16.0750000000004))
            ThreePointArc((-32.50000000000001, -16.0750000000004), (-31.548097038856298, -13.776902961144108), (-29.250000000000004, -12.825000000000399))
        make_face(mode=Mode.SUBTRACT)
    extrude(amount=CUT_EXTRUDE_6_DEPTH, mode=Mode.SUBTRACT)

    # Эскиз16<2> → Бобышка-Вытянуть22 (add)
    with BuildSketch(Plane(origin=(0, 0, 11.000000000000004), x_dir=(-1, 0, 0), z_dir=(0, 0, -1)).offset(EXTRUDE_START_2)):
        with Locations((29.25, -16.074999999999992)):
            Circle(SKETCH_16_2_R)
        with Locations((-29.250000000000004, -16.0750000000004)):
            Circle(SKETCH_16_2_R_2)
        with Locations((29.250000000000245, -39.57499999999999)):
            Circle(SKETCH_16_2_R_3)
        with Locations((-29.24999999999976, -39.5750000000004)):
            Circle(SKETCH_16_2_R_3)
    extrude(amount=EXTRUDE_22_DEPTH)


solid = part_2.part
